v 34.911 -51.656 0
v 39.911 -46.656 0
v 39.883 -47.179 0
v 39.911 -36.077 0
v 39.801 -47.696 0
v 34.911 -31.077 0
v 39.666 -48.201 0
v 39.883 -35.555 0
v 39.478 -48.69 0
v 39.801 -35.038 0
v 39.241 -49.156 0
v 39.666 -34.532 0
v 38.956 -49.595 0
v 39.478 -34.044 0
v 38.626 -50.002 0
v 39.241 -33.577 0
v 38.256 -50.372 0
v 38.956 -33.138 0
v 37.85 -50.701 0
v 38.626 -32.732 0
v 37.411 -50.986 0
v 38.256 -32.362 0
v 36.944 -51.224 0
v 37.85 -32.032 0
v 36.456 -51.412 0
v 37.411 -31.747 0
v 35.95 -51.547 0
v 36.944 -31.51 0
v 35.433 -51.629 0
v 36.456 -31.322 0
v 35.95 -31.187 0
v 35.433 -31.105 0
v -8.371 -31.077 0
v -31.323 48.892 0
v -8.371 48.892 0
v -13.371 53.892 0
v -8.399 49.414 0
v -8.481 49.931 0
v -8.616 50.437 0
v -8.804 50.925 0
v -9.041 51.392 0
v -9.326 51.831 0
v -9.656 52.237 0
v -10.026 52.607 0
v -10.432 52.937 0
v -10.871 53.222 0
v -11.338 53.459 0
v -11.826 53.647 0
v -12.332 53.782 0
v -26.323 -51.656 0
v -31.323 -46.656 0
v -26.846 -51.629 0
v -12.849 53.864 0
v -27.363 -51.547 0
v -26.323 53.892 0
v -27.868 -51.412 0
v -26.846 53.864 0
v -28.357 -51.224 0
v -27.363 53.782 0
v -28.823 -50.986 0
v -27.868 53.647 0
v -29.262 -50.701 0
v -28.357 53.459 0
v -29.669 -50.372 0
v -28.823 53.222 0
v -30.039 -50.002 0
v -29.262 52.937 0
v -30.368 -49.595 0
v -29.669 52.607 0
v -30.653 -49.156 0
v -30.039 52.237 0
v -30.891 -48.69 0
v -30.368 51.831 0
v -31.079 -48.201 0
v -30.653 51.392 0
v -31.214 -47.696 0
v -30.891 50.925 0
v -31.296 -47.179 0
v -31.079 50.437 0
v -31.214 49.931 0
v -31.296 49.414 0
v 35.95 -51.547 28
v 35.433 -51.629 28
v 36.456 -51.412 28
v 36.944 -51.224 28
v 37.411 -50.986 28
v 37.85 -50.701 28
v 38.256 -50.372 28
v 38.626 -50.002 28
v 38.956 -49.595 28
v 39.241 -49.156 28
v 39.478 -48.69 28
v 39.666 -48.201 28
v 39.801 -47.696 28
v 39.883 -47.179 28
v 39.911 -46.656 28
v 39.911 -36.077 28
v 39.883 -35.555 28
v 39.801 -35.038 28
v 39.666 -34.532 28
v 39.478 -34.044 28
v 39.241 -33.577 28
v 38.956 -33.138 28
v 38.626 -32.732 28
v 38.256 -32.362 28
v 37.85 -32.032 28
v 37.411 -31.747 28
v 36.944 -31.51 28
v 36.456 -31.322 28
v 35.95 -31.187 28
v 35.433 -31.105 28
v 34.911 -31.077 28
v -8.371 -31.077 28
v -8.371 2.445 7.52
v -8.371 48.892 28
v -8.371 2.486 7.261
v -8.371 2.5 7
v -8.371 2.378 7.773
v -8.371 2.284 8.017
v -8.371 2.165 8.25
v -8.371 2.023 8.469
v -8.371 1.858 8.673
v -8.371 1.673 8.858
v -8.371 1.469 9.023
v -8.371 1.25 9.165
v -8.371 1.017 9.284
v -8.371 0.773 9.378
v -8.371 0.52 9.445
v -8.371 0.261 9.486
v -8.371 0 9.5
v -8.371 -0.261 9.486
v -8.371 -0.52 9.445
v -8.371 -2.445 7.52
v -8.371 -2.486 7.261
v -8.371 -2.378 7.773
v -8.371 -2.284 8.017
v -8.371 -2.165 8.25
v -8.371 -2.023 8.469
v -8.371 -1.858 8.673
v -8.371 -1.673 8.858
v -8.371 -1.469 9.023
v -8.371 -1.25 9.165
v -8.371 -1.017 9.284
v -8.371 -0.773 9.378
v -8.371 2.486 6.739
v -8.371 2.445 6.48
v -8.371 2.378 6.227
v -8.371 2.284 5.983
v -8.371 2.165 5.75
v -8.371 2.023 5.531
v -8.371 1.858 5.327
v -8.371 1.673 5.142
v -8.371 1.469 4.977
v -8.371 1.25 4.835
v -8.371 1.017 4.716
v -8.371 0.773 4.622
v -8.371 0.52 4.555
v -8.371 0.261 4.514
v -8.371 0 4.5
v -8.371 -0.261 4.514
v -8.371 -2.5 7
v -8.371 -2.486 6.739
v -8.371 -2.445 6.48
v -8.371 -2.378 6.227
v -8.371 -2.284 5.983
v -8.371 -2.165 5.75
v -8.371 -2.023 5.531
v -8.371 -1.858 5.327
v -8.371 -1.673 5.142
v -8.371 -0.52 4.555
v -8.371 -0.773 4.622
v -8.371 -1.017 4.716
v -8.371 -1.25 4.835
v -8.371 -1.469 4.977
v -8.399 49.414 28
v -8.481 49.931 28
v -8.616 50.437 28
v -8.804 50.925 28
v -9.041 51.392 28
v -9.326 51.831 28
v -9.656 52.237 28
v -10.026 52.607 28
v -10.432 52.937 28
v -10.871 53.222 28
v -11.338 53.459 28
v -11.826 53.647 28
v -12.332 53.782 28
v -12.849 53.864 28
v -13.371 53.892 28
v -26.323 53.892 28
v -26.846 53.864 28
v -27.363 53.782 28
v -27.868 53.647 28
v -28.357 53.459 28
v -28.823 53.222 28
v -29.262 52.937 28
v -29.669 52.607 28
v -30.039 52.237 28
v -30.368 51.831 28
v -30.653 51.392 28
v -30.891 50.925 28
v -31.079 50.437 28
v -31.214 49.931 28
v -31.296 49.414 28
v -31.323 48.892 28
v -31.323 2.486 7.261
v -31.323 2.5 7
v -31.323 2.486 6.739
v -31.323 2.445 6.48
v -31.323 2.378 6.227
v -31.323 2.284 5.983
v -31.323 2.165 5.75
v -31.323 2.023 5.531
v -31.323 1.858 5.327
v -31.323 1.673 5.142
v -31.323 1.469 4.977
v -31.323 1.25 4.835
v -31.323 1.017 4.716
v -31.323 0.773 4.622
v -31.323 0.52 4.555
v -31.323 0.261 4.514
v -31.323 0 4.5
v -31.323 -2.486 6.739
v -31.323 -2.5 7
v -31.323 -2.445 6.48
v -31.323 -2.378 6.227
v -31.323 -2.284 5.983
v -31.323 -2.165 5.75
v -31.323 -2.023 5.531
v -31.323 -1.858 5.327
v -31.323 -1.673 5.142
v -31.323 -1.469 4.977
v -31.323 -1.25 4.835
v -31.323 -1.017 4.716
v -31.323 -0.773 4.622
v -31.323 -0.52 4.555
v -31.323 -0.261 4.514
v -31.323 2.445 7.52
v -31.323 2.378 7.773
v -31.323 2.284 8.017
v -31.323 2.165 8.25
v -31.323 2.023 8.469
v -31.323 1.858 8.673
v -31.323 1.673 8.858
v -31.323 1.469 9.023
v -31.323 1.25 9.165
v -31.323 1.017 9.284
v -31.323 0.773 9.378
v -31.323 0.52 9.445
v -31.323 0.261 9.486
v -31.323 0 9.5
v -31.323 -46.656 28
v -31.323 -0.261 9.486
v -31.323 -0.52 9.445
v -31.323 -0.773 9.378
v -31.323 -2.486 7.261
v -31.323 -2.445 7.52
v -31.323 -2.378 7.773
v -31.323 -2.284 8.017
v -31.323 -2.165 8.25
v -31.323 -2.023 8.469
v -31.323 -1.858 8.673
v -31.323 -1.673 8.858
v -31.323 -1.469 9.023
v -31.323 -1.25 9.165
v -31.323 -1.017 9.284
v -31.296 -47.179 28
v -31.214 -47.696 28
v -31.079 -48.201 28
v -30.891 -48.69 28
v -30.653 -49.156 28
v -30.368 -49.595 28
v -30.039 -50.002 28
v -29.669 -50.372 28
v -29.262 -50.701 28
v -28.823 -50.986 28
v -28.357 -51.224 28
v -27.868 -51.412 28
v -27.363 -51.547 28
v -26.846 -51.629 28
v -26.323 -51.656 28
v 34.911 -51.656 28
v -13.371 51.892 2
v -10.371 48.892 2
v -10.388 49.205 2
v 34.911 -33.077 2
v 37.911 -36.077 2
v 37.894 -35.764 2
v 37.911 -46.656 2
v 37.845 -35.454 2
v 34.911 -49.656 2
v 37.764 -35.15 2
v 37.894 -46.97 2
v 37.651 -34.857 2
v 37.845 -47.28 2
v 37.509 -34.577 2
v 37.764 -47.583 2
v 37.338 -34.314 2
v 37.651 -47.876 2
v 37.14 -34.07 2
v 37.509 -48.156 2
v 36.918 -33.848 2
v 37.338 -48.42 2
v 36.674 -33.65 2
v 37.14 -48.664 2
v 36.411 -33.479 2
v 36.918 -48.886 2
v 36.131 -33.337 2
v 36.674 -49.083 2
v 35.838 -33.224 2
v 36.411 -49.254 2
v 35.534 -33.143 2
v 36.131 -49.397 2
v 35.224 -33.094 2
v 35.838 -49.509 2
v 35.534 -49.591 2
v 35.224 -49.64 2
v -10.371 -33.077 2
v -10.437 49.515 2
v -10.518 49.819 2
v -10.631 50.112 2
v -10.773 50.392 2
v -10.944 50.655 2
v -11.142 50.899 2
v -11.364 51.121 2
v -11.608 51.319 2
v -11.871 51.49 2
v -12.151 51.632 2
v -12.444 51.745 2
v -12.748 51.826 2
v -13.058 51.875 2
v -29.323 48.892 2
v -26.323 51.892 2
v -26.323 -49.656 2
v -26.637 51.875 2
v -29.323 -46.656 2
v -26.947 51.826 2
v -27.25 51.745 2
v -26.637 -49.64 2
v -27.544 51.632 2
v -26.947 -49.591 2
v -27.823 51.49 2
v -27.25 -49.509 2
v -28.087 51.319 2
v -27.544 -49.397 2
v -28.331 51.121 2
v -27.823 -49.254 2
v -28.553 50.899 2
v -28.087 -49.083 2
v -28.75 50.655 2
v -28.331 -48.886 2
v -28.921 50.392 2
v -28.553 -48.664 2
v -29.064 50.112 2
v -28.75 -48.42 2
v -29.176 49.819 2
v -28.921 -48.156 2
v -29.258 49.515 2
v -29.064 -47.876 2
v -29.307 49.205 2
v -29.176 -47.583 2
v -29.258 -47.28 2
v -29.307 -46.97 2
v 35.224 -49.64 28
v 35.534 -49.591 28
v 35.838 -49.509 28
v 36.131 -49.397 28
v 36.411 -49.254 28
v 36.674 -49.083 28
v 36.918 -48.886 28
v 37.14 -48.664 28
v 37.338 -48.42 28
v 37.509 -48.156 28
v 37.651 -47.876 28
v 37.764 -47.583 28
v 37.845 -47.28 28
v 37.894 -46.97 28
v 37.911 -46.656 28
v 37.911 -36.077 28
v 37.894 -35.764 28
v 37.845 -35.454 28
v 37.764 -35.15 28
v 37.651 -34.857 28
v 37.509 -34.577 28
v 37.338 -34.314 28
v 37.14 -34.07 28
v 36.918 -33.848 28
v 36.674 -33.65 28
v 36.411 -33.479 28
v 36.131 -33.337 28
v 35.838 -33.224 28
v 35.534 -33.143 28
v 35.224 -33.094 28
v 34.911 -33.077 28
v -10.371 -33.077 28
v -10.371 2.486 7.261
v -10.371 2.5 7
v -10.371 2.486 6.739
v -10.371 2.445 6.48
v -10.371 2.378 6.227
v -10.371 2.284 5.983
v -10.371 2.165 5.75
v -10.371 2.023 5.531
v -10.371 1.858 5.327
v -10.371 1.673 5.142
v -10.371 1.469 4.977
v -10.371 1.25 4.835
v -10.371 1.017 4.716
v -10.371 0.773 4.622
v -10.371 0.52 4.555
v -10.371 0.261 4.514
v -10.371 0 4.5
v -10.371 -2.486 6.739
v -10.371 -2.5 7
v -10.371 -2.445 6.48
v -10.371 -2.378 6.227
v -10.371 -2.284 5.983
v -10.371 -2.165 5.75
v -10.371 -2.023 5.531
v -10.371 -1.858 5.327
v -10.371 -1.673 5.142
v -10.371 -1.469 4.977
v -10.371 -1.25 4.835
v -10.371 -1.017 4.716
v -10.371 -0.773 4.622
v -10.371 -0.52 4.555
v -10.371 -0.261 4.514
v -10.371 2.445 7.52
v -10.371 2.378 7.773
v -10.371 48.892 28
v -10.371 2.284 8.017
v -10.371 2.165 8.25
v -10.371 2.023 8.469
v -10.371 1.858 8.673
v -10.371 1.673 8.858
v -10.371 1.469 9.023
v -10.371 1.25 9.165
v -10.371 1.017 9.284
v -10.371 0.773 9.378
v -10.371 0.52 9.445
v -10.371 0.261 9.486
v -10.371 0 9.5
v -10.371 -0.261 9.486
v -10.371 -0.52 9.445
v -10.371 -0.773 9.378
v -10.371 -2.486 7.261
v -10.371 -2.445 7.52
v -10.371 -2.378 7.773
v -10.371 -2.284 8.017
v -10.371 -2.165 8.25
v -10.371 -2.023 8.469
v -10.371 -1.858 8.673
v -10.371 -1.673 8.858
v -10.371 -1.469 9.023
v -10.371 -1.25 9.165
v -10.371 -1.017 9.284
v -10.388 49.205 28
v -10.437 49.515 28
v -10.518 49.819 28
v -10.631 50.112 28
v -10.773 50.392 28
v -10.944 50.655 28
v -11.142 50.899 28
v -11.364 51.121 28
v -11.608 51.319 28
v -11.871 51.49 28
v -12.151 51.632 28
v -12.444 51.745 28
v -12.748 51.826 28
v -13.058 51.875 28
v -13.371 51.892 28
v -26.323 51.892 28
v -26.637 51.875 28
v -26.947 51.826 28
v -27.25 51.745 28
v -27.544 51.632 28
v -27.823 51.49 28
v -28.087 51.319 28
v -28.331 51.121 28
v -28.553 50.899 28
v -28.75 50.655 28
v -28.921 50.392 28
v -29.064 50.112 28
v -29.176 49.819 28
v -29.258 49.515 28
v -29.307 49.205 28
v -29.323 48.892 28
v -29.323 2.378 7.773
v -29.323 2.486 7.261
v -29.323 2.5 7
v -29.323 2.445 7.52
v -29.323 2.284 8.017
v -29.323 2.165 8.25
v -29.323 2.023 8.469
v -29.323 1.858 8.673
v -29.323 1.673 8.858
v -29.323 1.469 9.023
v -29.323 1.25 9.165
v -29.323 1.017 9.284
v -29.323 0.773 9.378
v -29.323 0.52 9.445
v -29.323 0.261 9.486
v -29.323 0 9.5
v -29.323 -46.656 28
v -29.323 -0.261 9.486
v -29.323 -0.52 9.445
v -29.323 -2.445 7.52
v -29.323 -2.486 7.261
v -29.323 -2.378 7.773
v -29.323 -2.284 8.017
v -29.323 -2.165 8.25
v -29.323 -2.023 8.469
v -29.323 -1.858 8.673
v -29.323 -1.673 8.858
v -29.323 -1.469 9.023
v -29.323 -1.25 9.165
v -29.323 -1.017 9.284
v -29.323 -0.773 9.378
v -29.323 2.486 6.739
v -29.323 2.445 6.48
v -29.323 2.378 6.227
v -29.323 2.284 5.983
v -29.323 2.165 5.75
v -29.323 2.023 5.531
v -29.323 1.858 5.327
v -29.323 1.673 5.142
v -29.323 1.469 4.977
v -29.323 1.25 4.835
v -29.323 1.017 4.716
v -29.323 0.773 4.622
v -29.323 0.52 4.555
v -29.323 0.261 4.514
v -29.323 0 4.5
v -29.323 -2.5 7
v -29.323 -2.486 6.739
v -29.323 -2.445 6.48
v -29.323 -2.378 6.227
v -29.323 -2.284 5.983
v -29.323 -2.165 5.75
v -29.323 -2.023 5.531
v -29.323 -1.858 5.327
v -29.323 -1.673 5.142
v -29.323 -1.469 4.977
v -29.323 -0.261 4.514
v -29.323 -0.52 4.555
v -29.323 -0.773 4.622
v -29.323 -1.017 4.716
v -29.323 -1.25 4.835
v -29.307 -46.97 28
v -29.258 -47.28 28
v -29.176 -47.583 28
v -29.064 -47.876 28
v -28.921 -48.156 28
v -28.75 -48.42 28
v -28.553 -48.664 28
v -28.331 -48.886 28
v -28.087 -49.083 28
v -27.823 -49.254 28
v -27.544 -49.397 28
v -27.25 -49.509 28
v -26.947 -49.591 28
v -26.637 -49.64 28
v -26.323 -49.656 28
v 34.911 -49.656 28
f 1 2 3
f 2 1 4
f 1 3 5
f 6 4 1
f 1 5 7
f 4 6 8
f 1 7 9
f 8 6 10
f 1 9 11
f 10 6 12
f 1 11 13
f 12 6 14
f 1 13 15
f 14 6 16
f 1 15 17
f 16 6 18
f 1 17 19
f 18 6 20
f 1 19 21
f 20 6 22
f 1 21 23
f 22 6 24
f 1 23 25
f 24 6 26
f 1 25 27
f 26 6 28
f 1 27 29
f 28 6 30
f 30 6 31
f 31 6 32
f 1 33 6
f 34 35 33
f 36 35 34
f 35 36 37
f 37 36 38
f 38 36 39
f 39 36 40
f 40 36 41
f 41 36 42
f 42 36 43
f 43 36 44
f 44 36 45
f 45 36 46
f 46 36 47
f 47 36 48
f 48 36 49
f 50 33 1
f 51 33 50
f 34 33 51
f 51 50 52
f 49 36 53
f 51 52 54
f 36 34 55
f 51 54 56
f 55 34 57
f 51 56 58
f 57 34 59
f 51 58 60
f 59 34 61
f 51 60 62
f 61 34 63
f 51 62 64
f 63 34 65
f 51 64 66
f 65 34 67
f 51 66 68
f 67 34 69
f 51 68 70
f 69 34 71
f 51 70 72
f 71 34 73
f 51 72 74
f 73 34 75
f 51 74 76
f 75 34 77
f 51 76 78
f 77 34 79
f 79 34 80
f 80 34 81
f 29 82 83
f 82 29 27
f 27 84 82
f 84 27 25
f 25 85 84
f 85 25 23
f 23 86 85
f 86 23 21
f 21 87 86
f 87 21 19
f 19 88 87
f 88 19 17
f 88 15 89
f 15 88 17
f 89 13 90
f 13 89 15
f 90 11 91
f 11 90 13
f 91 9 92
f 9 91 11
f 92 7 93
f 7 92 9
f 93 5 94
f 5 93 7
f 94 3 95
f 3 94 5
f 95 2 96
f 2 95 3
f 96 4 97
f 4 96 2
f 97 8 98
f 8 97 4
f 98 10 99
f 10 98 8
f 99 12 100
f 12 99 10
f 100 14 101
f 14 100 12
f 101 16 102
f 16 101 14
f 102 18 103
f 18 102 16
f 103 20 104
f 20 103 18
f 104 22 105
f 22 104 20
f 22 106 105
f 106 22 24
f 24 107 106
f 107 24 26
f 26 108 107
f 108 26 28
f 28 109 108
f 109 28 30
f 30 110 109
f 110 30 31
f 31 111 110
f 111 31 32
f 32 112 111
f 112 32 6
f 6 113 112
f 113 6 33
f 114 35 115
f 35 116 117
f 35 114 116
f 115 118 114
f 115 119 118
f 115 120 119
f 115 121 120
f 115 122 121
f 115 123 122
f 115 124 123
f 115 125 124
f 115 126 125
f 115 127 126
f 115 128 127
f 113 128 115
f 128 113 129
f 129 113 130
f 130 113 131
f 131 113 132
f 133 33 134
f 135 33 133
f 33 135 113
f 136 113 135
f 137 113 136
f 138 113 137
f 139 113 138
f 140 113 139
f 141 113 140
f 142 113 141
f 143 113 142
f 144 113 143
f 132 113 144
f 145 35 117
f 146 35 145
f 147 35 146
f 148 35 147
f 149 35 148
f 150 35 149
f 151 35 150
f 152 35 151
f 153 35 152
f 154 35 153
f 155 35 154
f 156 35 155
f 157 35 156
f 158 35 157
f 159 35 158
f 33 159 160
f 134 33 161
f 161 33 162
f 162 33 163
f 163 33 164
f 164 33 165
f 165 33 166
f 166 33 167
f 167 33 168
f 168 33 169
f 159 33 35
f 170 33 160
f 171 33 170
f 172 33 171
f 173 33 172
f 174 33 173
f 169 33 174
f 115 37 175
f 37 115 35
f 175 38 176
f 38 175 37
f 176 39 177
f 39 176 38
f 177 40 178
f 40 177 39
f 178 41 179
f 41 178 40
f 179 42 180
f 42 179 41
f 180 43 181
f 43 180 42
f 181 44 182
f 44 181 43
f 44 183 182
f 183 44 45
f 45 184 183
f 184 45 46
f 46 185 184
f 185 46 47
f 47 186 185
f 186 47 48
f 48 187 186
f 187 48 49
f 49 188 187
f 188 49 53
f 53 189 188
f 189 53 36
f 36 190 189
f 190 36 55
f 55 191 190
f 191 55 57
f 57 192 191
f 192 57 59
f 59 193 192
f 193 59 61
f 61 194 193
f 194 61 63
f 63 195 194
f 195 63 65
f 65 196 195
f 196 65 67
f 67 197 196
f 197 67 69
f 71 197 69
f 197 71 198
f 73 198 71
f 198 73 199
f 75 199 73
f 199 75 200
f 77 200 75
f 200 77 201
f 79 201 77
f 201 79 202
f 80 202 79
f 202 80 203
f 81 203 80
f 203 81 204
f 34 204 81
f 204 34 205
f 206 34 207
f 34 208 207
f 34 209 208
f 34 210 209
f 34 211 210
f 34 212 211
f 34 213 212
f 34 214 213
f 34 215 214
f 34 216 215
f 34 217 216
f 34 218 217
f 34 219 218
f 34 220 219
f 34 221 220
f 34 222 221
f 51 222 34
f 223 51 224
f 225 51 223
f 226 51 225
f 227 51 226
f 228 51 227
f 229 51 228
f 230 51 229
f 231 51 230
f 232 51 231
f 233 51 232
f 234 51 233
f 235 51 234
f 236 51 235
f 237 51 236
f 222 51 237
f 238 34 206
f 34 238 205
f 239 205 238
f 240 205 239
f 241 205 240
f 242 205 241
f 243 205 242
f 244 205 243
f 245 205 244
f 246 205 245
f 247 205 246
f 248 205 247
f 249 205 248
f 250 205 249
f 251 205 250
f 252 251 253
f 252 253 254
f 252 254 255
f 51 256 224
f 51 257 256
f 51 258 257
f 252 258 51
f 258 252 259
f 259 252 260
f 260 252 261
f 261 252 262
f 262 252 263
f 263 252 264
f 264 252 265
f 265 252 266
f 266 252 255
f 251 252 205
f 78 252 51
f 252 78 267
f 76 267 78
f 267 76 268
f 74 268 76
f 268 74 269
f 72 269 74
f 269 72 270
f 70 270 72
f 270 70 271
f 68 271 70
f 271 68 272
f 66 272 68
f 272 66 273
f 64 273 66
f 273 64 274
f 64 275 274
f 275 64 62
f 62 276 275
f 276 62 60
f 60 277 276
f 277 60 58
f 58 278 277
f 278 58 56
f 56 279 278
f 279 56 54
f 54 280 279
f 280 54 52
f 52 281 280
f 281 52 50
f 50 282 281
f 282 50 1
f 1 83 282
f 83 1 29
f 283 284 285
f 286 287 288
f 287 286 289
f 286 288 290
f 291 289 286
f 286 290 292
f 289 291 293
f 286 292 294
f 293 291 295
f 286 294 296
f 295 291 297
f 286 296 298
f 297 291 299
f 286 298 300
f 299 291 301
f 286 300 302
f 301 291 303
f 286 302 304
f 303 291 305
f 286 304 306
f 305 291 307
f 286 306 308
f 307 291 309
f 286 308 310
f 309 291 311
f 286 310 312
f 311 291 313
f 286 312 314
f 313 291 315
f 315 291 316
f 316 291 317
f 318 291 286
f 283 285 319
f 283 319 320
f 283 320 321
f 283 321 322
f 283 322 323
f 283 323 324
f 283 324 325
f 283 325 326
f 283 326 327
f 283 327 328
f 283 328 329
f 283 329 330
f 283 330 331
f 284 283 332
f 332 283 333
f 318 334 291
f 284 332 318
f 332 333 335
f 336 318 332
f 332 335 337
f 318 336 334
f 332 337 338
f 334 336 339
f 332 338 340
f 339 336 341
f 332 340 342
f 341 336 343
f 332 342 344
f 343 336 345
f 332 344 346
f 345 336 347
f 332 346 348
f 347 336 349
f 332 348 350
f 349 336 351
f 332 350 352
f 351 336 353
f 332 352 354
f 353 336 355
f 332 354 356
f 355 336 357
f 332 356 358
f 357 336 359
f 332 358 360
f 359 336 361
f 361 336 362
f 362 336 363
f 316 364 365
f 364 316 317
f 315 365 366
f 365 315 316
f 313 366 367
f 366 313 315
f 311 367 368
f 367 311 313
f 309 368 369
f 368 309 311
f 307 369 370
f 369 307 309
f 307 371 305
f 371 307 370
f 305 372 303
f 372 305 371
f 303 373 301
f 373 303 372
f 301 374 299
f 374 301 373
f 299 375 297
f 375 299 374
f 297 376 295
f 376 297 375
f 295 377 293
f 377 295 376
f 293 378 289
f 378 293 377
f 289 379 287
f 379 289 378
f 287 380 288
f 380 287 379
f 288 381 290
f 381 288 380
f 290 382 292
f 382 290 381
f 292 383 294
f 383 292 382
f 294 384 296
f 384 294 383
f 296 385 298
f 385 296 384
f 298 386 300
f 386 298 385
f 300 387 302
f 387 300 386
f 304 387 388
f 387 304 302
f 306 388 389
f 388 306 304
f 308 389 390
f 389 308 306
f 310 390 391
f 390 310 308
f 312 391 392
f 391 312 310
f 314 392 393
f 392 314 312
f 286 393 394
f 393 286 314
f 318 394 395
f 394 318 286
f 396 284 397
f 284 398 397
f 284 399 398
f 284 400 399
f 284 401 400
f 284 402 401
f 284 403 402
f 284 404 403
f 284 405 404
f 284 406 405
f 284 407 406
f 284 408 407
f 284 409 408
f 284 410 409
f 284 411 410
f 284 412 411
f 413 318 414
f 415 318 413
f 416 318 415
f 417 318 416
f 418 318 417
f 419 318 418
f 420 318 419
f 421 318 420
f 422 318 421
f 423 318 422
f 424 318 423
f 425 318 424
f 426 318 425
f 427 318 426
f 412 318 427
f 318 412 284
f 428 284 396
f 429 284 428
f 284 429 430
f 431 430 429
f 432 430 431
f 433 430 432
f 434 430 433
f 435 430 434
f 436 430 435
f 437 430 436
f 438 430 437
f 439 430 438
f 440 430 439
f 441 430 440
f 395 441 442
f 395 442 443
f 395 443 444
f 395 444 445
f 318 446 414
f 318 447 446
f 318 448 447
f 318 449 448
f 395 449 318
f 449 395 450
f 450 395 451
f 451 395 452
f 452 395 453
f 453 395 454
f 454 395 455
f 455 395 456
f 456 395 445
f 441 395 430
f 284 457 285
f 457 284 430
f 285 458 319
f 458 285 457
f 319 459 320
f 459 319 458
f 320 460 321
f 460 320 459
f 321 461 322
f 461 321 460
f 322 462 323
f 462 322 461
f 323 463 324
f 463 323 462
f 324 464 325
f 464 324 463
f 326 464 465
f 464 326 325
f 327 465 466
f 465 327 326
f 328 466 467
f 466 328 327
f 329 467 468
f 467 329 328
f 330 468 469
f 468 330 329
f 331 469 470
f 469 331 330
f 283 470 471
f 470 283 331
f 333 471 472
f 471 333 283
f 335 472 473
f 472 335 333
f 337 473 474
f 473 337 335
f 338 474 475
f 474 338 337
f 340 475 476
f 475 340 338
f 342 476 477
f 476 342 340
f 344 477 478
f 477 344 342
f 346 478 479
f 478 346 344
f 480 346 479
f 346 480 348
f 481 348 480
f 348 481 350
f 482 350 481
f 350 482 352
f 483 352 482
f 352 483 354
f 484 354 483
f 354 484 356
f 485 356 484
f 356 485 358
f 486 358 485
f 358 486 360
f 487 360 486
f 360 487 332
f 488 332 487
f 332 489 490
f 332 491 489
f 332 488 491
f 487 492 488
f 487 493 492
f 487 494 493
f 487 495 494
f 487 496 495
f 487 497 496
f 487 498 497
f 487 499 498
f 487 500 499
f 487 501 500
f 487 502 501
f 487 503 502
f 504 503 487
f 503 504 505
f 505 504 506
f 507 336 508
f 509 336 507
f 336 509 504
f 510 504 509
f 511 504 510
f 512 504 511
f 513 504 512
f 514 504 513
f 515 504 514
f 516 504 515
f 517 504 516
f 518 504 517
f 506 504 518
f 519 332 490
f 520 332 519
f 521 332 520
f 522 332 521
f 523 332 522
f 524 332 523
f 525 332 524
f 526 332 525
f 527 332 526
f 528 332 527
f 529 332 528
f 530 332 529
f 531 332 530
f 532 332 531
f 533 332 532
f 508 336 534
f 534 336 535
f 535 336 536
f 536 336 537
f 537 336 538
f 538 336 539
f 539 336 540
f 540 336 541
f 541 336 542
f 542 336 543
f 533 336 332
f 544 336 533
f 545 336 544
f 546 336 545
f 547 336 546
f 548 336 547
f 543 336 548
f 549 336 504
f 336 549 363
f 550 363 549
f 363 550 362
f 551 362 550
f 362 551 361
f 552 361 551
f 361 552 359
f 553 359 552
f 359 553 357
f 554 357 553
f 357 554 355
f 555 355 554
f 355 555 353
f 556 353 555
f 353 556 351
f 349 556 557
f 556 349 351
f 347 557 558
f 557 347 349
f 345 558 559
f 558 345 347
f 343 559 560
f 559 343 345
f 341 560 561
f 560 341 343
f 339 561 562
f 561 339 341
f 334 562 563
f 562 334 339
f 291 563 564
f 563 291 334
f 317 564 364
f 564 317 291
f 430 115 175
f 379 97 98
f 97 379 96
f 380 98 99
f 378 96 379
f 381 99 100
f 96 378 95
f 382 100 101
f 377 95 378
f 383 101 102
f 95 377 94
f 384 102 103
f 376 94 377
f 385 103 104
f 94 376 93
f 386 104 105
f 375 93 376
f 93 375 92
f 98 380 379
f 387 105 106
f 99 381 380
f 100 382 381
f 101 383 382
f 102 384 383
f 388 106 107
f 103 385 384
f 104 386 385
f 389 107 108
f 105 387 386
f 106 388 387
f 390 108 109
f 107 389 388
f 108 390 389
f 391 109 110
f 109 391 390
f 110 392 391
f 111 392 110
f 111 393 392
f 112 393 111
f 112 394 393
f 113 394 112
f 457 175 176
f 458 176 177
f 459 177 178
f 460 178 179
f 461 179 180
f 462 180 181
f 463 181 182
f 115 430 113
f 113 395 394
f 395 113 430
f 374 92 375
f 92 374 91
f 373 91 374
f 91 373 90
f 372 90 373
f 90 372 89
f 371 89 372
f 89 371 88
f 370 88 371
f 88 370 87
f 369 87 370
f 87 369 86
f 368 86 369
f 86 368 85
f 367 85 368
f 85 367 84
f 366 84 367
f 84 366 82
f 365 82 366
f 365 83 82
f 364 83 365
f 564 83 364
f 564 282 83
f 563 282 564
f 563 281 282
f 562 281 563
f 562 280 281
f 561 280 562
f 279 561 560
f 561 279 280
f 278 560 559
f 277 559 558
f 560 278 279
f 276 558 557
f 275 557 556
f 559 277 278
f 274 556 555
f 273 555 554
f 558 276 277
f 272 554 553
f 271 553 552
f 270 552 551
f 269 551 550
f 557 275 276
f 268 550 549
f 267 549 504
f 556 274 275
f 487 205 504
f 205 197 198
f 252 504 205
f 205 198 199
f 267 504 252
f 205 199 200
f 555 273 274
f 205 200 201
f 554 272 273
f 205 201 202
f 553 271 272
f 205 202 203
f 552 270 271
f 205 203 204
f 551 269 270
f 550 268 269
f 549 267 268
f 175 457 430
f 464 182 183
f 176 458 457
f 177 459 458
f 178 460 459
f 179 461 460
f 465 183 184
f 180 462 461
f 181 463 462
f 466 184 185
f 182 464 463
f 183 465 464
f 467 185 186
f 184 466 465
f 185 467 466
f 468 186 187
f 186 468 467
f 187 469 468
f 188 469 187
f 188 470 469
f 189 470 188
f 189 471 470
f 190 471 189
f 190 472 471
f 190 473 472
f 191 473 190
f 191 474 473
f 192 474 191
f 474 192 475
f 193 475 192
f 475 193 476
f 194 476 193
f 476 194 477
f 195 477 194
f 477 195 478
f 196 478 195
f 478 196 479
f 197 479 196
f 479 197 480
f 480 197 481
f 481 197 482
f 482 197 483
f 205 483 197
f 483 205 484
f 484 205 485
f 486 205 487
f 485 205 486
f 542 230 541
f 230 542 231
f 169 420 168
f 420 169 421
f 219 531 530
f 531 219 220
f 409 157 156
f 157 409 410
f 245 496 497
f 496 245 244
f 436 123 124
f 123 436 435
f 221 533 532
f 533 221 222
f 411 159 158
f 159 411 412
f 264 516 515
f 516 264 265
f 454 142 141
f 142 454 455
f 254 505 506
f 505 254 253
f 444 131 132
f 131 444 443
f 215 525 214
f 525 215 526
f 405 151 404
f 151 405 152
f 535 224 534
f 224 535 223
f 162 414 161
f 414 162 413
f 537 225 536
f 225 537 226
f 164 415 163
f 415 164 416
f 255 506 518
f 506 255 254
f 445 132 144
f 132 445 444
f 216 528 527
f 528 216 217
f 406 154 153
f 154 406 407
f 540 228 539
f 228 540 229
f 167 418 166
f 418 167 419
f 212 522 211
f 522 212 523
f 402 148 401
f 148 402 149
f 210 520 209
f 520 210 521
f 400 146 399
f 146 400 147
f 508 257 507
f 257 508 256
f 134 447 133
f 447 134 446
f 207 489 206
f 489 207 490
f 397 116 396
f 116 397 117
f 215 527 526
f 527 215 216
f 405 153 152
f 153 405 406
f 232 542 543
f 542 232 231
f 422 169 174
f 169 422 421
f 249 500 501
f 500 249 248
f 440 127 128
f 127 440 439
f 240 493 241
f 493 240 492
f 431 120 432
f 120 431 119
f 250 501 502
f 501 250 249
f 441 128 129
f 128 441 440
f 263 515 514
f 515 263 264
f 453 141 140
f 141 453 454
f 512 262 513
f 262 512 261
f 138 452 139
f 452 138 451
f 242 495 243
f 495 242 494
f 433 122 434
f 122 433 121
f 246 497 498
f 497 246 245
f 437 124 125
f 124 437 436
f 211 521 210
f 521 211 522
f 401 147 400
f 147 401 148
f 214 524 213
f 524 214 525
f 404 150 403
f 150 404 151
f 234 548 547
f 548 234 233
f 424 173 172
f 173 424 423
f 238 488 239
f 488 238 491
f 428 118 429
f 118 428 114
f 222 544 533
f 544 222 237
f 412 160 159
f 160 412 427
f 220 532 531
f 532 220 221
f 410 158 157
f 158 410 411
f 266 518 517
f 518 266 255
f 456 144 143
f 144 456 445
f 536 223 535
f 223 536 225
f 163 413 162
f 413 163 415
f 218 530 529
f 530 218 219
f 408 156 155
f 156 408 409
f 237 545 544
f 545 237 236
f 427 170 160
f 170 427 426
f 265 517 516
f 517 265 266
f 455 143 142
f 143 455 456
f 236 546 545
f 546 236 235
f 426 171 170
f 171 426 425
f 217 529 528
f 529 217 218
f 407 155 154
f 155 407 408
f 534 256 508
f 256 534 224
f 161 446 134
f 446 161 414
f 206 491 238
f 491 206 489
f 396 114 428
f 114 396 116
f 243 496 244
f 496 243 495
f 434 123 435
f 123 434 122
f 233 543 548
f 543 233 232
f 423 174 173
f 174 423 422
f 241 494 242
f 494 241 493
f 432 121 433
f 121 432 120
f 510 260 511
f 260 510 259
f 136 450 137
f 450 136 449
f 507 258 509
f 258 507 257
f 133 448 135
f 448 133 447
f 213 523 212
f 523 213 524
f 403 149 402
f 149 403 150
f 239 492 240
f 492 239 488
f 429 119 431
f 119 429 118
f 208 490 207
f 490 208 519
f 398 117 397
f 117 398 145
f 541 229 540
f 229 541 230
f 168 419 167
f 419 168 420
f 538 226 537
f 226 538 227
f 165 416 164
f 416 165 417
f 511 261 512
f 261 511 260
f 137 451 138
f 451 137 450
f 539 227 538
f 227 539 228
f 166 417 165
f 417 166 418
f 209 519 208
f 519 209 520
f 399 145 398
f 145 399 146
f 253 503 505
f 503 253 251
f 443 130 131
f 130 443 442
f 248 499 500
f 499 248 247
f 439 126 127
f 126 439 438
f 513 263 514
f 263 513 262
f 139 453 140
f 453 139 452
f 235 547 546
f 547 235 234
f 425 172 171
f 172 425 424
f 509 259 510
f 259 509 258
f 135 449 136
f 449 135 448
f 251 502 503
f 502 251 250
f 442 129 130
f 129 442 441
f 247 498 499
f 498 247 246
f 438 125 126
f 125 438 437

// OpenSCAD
// AUTOMATICALLY GENERATED FILE: Letter_L
// SIGN SCULPTOR ENGINE V2

Render_Mode = "Body"; // Set to "Lid" to export the cover
Letter = "L";
Font_Size = 100;
Font_Name = "Arial:style=Black";
Light_Type = "Silicone_Neon_6mm";

// -- Engineering Constants --
Sign_Height = 30.0;
Wall_Thickness = 2.0;
Base_Thickness = 2.0;
Lid_Tolerance = 0.15;
Hole_Height = 5.0;
Hole_Size = 5.0;

// -- Logic Engine --
CW = (Light_Type == "Silicone_Neon_6mm") ? 6.0 :
     (Light_Type == "Silicone_Neon_8mm") ? 8.0 :
     (Light_Type == "LED_Strip_10mm")    ? 10.5 :
     (Light_Type == "Individual_Pixels")  ? 14.0 : 6.0;

Lip_Overhang = (Light_Type == "Silicone_Neon_6mm" || Light_Type == "Silicone_Neon_8mm") ? 0.4 : 0.0;

$fn = 60;

module letter_shape() {
    text(text=Letter, size=Font_Size, font=Font_Name, halign="center", valign="center");
}

module body_geometry() {
    difference() {
        // 1. Positive Block
        linear_extrude(Sign_Height)
            offset(r = CW/2 + Wall_Thickness)
            letter_shape();

        // 2. Light Channel
        translate([0,0, Base_Thickness])
            linear_extrude(Sign_Height + 1)
            offset(r = CW/2)
            letter_shape();

        // 3. Friction Lip
        if (Lip_Overhang > 0) {
            translate([0,0, Sign_Height - 2.0])
                linear_extrude(3.0)
                difference() {
                    offset(r = CW/2 + 5) letter_shape();
                    offset(r = CW/2 - Lip_Overhang) letter_shape();
                }
        }
        
        // 4. Lid Shelf
        translate([0,0, Sign_Height - 2.0])
            linear_extrude(3.0)
            offset(r = CW/2 + 1.5)
            letter_shape();

        // 5. WIRE CHANNELS (Dynamic Side Holes)
        // Left Hole
        translate([-Font_Size/1.8, 0, Hole_Height + Base_Thickness])
            rotate([0, 90, 0])
            cylinder(h = Font_Size, r = Hole_Size/2);
            
        // Right Hole
        translate([Font_Size/1.8, 0, Hole_Height + Base_Thickness])
            rotate([0, -90, 0])
            cylinder(h = Font_Size, r = Hole_Size/2);
    }
}

module lid_geometry() {
    color("White")
        linear_extrude(2.0)
        offset(r = (CW/2 + 1.5) - Lid_Tolerance)
        letter_shape();
}

// Render Controller
if (Render_Mode == "Body") {
    body_geometry();
} else if (Render_Mode == "Lid") {
    lid_geometry();
}
